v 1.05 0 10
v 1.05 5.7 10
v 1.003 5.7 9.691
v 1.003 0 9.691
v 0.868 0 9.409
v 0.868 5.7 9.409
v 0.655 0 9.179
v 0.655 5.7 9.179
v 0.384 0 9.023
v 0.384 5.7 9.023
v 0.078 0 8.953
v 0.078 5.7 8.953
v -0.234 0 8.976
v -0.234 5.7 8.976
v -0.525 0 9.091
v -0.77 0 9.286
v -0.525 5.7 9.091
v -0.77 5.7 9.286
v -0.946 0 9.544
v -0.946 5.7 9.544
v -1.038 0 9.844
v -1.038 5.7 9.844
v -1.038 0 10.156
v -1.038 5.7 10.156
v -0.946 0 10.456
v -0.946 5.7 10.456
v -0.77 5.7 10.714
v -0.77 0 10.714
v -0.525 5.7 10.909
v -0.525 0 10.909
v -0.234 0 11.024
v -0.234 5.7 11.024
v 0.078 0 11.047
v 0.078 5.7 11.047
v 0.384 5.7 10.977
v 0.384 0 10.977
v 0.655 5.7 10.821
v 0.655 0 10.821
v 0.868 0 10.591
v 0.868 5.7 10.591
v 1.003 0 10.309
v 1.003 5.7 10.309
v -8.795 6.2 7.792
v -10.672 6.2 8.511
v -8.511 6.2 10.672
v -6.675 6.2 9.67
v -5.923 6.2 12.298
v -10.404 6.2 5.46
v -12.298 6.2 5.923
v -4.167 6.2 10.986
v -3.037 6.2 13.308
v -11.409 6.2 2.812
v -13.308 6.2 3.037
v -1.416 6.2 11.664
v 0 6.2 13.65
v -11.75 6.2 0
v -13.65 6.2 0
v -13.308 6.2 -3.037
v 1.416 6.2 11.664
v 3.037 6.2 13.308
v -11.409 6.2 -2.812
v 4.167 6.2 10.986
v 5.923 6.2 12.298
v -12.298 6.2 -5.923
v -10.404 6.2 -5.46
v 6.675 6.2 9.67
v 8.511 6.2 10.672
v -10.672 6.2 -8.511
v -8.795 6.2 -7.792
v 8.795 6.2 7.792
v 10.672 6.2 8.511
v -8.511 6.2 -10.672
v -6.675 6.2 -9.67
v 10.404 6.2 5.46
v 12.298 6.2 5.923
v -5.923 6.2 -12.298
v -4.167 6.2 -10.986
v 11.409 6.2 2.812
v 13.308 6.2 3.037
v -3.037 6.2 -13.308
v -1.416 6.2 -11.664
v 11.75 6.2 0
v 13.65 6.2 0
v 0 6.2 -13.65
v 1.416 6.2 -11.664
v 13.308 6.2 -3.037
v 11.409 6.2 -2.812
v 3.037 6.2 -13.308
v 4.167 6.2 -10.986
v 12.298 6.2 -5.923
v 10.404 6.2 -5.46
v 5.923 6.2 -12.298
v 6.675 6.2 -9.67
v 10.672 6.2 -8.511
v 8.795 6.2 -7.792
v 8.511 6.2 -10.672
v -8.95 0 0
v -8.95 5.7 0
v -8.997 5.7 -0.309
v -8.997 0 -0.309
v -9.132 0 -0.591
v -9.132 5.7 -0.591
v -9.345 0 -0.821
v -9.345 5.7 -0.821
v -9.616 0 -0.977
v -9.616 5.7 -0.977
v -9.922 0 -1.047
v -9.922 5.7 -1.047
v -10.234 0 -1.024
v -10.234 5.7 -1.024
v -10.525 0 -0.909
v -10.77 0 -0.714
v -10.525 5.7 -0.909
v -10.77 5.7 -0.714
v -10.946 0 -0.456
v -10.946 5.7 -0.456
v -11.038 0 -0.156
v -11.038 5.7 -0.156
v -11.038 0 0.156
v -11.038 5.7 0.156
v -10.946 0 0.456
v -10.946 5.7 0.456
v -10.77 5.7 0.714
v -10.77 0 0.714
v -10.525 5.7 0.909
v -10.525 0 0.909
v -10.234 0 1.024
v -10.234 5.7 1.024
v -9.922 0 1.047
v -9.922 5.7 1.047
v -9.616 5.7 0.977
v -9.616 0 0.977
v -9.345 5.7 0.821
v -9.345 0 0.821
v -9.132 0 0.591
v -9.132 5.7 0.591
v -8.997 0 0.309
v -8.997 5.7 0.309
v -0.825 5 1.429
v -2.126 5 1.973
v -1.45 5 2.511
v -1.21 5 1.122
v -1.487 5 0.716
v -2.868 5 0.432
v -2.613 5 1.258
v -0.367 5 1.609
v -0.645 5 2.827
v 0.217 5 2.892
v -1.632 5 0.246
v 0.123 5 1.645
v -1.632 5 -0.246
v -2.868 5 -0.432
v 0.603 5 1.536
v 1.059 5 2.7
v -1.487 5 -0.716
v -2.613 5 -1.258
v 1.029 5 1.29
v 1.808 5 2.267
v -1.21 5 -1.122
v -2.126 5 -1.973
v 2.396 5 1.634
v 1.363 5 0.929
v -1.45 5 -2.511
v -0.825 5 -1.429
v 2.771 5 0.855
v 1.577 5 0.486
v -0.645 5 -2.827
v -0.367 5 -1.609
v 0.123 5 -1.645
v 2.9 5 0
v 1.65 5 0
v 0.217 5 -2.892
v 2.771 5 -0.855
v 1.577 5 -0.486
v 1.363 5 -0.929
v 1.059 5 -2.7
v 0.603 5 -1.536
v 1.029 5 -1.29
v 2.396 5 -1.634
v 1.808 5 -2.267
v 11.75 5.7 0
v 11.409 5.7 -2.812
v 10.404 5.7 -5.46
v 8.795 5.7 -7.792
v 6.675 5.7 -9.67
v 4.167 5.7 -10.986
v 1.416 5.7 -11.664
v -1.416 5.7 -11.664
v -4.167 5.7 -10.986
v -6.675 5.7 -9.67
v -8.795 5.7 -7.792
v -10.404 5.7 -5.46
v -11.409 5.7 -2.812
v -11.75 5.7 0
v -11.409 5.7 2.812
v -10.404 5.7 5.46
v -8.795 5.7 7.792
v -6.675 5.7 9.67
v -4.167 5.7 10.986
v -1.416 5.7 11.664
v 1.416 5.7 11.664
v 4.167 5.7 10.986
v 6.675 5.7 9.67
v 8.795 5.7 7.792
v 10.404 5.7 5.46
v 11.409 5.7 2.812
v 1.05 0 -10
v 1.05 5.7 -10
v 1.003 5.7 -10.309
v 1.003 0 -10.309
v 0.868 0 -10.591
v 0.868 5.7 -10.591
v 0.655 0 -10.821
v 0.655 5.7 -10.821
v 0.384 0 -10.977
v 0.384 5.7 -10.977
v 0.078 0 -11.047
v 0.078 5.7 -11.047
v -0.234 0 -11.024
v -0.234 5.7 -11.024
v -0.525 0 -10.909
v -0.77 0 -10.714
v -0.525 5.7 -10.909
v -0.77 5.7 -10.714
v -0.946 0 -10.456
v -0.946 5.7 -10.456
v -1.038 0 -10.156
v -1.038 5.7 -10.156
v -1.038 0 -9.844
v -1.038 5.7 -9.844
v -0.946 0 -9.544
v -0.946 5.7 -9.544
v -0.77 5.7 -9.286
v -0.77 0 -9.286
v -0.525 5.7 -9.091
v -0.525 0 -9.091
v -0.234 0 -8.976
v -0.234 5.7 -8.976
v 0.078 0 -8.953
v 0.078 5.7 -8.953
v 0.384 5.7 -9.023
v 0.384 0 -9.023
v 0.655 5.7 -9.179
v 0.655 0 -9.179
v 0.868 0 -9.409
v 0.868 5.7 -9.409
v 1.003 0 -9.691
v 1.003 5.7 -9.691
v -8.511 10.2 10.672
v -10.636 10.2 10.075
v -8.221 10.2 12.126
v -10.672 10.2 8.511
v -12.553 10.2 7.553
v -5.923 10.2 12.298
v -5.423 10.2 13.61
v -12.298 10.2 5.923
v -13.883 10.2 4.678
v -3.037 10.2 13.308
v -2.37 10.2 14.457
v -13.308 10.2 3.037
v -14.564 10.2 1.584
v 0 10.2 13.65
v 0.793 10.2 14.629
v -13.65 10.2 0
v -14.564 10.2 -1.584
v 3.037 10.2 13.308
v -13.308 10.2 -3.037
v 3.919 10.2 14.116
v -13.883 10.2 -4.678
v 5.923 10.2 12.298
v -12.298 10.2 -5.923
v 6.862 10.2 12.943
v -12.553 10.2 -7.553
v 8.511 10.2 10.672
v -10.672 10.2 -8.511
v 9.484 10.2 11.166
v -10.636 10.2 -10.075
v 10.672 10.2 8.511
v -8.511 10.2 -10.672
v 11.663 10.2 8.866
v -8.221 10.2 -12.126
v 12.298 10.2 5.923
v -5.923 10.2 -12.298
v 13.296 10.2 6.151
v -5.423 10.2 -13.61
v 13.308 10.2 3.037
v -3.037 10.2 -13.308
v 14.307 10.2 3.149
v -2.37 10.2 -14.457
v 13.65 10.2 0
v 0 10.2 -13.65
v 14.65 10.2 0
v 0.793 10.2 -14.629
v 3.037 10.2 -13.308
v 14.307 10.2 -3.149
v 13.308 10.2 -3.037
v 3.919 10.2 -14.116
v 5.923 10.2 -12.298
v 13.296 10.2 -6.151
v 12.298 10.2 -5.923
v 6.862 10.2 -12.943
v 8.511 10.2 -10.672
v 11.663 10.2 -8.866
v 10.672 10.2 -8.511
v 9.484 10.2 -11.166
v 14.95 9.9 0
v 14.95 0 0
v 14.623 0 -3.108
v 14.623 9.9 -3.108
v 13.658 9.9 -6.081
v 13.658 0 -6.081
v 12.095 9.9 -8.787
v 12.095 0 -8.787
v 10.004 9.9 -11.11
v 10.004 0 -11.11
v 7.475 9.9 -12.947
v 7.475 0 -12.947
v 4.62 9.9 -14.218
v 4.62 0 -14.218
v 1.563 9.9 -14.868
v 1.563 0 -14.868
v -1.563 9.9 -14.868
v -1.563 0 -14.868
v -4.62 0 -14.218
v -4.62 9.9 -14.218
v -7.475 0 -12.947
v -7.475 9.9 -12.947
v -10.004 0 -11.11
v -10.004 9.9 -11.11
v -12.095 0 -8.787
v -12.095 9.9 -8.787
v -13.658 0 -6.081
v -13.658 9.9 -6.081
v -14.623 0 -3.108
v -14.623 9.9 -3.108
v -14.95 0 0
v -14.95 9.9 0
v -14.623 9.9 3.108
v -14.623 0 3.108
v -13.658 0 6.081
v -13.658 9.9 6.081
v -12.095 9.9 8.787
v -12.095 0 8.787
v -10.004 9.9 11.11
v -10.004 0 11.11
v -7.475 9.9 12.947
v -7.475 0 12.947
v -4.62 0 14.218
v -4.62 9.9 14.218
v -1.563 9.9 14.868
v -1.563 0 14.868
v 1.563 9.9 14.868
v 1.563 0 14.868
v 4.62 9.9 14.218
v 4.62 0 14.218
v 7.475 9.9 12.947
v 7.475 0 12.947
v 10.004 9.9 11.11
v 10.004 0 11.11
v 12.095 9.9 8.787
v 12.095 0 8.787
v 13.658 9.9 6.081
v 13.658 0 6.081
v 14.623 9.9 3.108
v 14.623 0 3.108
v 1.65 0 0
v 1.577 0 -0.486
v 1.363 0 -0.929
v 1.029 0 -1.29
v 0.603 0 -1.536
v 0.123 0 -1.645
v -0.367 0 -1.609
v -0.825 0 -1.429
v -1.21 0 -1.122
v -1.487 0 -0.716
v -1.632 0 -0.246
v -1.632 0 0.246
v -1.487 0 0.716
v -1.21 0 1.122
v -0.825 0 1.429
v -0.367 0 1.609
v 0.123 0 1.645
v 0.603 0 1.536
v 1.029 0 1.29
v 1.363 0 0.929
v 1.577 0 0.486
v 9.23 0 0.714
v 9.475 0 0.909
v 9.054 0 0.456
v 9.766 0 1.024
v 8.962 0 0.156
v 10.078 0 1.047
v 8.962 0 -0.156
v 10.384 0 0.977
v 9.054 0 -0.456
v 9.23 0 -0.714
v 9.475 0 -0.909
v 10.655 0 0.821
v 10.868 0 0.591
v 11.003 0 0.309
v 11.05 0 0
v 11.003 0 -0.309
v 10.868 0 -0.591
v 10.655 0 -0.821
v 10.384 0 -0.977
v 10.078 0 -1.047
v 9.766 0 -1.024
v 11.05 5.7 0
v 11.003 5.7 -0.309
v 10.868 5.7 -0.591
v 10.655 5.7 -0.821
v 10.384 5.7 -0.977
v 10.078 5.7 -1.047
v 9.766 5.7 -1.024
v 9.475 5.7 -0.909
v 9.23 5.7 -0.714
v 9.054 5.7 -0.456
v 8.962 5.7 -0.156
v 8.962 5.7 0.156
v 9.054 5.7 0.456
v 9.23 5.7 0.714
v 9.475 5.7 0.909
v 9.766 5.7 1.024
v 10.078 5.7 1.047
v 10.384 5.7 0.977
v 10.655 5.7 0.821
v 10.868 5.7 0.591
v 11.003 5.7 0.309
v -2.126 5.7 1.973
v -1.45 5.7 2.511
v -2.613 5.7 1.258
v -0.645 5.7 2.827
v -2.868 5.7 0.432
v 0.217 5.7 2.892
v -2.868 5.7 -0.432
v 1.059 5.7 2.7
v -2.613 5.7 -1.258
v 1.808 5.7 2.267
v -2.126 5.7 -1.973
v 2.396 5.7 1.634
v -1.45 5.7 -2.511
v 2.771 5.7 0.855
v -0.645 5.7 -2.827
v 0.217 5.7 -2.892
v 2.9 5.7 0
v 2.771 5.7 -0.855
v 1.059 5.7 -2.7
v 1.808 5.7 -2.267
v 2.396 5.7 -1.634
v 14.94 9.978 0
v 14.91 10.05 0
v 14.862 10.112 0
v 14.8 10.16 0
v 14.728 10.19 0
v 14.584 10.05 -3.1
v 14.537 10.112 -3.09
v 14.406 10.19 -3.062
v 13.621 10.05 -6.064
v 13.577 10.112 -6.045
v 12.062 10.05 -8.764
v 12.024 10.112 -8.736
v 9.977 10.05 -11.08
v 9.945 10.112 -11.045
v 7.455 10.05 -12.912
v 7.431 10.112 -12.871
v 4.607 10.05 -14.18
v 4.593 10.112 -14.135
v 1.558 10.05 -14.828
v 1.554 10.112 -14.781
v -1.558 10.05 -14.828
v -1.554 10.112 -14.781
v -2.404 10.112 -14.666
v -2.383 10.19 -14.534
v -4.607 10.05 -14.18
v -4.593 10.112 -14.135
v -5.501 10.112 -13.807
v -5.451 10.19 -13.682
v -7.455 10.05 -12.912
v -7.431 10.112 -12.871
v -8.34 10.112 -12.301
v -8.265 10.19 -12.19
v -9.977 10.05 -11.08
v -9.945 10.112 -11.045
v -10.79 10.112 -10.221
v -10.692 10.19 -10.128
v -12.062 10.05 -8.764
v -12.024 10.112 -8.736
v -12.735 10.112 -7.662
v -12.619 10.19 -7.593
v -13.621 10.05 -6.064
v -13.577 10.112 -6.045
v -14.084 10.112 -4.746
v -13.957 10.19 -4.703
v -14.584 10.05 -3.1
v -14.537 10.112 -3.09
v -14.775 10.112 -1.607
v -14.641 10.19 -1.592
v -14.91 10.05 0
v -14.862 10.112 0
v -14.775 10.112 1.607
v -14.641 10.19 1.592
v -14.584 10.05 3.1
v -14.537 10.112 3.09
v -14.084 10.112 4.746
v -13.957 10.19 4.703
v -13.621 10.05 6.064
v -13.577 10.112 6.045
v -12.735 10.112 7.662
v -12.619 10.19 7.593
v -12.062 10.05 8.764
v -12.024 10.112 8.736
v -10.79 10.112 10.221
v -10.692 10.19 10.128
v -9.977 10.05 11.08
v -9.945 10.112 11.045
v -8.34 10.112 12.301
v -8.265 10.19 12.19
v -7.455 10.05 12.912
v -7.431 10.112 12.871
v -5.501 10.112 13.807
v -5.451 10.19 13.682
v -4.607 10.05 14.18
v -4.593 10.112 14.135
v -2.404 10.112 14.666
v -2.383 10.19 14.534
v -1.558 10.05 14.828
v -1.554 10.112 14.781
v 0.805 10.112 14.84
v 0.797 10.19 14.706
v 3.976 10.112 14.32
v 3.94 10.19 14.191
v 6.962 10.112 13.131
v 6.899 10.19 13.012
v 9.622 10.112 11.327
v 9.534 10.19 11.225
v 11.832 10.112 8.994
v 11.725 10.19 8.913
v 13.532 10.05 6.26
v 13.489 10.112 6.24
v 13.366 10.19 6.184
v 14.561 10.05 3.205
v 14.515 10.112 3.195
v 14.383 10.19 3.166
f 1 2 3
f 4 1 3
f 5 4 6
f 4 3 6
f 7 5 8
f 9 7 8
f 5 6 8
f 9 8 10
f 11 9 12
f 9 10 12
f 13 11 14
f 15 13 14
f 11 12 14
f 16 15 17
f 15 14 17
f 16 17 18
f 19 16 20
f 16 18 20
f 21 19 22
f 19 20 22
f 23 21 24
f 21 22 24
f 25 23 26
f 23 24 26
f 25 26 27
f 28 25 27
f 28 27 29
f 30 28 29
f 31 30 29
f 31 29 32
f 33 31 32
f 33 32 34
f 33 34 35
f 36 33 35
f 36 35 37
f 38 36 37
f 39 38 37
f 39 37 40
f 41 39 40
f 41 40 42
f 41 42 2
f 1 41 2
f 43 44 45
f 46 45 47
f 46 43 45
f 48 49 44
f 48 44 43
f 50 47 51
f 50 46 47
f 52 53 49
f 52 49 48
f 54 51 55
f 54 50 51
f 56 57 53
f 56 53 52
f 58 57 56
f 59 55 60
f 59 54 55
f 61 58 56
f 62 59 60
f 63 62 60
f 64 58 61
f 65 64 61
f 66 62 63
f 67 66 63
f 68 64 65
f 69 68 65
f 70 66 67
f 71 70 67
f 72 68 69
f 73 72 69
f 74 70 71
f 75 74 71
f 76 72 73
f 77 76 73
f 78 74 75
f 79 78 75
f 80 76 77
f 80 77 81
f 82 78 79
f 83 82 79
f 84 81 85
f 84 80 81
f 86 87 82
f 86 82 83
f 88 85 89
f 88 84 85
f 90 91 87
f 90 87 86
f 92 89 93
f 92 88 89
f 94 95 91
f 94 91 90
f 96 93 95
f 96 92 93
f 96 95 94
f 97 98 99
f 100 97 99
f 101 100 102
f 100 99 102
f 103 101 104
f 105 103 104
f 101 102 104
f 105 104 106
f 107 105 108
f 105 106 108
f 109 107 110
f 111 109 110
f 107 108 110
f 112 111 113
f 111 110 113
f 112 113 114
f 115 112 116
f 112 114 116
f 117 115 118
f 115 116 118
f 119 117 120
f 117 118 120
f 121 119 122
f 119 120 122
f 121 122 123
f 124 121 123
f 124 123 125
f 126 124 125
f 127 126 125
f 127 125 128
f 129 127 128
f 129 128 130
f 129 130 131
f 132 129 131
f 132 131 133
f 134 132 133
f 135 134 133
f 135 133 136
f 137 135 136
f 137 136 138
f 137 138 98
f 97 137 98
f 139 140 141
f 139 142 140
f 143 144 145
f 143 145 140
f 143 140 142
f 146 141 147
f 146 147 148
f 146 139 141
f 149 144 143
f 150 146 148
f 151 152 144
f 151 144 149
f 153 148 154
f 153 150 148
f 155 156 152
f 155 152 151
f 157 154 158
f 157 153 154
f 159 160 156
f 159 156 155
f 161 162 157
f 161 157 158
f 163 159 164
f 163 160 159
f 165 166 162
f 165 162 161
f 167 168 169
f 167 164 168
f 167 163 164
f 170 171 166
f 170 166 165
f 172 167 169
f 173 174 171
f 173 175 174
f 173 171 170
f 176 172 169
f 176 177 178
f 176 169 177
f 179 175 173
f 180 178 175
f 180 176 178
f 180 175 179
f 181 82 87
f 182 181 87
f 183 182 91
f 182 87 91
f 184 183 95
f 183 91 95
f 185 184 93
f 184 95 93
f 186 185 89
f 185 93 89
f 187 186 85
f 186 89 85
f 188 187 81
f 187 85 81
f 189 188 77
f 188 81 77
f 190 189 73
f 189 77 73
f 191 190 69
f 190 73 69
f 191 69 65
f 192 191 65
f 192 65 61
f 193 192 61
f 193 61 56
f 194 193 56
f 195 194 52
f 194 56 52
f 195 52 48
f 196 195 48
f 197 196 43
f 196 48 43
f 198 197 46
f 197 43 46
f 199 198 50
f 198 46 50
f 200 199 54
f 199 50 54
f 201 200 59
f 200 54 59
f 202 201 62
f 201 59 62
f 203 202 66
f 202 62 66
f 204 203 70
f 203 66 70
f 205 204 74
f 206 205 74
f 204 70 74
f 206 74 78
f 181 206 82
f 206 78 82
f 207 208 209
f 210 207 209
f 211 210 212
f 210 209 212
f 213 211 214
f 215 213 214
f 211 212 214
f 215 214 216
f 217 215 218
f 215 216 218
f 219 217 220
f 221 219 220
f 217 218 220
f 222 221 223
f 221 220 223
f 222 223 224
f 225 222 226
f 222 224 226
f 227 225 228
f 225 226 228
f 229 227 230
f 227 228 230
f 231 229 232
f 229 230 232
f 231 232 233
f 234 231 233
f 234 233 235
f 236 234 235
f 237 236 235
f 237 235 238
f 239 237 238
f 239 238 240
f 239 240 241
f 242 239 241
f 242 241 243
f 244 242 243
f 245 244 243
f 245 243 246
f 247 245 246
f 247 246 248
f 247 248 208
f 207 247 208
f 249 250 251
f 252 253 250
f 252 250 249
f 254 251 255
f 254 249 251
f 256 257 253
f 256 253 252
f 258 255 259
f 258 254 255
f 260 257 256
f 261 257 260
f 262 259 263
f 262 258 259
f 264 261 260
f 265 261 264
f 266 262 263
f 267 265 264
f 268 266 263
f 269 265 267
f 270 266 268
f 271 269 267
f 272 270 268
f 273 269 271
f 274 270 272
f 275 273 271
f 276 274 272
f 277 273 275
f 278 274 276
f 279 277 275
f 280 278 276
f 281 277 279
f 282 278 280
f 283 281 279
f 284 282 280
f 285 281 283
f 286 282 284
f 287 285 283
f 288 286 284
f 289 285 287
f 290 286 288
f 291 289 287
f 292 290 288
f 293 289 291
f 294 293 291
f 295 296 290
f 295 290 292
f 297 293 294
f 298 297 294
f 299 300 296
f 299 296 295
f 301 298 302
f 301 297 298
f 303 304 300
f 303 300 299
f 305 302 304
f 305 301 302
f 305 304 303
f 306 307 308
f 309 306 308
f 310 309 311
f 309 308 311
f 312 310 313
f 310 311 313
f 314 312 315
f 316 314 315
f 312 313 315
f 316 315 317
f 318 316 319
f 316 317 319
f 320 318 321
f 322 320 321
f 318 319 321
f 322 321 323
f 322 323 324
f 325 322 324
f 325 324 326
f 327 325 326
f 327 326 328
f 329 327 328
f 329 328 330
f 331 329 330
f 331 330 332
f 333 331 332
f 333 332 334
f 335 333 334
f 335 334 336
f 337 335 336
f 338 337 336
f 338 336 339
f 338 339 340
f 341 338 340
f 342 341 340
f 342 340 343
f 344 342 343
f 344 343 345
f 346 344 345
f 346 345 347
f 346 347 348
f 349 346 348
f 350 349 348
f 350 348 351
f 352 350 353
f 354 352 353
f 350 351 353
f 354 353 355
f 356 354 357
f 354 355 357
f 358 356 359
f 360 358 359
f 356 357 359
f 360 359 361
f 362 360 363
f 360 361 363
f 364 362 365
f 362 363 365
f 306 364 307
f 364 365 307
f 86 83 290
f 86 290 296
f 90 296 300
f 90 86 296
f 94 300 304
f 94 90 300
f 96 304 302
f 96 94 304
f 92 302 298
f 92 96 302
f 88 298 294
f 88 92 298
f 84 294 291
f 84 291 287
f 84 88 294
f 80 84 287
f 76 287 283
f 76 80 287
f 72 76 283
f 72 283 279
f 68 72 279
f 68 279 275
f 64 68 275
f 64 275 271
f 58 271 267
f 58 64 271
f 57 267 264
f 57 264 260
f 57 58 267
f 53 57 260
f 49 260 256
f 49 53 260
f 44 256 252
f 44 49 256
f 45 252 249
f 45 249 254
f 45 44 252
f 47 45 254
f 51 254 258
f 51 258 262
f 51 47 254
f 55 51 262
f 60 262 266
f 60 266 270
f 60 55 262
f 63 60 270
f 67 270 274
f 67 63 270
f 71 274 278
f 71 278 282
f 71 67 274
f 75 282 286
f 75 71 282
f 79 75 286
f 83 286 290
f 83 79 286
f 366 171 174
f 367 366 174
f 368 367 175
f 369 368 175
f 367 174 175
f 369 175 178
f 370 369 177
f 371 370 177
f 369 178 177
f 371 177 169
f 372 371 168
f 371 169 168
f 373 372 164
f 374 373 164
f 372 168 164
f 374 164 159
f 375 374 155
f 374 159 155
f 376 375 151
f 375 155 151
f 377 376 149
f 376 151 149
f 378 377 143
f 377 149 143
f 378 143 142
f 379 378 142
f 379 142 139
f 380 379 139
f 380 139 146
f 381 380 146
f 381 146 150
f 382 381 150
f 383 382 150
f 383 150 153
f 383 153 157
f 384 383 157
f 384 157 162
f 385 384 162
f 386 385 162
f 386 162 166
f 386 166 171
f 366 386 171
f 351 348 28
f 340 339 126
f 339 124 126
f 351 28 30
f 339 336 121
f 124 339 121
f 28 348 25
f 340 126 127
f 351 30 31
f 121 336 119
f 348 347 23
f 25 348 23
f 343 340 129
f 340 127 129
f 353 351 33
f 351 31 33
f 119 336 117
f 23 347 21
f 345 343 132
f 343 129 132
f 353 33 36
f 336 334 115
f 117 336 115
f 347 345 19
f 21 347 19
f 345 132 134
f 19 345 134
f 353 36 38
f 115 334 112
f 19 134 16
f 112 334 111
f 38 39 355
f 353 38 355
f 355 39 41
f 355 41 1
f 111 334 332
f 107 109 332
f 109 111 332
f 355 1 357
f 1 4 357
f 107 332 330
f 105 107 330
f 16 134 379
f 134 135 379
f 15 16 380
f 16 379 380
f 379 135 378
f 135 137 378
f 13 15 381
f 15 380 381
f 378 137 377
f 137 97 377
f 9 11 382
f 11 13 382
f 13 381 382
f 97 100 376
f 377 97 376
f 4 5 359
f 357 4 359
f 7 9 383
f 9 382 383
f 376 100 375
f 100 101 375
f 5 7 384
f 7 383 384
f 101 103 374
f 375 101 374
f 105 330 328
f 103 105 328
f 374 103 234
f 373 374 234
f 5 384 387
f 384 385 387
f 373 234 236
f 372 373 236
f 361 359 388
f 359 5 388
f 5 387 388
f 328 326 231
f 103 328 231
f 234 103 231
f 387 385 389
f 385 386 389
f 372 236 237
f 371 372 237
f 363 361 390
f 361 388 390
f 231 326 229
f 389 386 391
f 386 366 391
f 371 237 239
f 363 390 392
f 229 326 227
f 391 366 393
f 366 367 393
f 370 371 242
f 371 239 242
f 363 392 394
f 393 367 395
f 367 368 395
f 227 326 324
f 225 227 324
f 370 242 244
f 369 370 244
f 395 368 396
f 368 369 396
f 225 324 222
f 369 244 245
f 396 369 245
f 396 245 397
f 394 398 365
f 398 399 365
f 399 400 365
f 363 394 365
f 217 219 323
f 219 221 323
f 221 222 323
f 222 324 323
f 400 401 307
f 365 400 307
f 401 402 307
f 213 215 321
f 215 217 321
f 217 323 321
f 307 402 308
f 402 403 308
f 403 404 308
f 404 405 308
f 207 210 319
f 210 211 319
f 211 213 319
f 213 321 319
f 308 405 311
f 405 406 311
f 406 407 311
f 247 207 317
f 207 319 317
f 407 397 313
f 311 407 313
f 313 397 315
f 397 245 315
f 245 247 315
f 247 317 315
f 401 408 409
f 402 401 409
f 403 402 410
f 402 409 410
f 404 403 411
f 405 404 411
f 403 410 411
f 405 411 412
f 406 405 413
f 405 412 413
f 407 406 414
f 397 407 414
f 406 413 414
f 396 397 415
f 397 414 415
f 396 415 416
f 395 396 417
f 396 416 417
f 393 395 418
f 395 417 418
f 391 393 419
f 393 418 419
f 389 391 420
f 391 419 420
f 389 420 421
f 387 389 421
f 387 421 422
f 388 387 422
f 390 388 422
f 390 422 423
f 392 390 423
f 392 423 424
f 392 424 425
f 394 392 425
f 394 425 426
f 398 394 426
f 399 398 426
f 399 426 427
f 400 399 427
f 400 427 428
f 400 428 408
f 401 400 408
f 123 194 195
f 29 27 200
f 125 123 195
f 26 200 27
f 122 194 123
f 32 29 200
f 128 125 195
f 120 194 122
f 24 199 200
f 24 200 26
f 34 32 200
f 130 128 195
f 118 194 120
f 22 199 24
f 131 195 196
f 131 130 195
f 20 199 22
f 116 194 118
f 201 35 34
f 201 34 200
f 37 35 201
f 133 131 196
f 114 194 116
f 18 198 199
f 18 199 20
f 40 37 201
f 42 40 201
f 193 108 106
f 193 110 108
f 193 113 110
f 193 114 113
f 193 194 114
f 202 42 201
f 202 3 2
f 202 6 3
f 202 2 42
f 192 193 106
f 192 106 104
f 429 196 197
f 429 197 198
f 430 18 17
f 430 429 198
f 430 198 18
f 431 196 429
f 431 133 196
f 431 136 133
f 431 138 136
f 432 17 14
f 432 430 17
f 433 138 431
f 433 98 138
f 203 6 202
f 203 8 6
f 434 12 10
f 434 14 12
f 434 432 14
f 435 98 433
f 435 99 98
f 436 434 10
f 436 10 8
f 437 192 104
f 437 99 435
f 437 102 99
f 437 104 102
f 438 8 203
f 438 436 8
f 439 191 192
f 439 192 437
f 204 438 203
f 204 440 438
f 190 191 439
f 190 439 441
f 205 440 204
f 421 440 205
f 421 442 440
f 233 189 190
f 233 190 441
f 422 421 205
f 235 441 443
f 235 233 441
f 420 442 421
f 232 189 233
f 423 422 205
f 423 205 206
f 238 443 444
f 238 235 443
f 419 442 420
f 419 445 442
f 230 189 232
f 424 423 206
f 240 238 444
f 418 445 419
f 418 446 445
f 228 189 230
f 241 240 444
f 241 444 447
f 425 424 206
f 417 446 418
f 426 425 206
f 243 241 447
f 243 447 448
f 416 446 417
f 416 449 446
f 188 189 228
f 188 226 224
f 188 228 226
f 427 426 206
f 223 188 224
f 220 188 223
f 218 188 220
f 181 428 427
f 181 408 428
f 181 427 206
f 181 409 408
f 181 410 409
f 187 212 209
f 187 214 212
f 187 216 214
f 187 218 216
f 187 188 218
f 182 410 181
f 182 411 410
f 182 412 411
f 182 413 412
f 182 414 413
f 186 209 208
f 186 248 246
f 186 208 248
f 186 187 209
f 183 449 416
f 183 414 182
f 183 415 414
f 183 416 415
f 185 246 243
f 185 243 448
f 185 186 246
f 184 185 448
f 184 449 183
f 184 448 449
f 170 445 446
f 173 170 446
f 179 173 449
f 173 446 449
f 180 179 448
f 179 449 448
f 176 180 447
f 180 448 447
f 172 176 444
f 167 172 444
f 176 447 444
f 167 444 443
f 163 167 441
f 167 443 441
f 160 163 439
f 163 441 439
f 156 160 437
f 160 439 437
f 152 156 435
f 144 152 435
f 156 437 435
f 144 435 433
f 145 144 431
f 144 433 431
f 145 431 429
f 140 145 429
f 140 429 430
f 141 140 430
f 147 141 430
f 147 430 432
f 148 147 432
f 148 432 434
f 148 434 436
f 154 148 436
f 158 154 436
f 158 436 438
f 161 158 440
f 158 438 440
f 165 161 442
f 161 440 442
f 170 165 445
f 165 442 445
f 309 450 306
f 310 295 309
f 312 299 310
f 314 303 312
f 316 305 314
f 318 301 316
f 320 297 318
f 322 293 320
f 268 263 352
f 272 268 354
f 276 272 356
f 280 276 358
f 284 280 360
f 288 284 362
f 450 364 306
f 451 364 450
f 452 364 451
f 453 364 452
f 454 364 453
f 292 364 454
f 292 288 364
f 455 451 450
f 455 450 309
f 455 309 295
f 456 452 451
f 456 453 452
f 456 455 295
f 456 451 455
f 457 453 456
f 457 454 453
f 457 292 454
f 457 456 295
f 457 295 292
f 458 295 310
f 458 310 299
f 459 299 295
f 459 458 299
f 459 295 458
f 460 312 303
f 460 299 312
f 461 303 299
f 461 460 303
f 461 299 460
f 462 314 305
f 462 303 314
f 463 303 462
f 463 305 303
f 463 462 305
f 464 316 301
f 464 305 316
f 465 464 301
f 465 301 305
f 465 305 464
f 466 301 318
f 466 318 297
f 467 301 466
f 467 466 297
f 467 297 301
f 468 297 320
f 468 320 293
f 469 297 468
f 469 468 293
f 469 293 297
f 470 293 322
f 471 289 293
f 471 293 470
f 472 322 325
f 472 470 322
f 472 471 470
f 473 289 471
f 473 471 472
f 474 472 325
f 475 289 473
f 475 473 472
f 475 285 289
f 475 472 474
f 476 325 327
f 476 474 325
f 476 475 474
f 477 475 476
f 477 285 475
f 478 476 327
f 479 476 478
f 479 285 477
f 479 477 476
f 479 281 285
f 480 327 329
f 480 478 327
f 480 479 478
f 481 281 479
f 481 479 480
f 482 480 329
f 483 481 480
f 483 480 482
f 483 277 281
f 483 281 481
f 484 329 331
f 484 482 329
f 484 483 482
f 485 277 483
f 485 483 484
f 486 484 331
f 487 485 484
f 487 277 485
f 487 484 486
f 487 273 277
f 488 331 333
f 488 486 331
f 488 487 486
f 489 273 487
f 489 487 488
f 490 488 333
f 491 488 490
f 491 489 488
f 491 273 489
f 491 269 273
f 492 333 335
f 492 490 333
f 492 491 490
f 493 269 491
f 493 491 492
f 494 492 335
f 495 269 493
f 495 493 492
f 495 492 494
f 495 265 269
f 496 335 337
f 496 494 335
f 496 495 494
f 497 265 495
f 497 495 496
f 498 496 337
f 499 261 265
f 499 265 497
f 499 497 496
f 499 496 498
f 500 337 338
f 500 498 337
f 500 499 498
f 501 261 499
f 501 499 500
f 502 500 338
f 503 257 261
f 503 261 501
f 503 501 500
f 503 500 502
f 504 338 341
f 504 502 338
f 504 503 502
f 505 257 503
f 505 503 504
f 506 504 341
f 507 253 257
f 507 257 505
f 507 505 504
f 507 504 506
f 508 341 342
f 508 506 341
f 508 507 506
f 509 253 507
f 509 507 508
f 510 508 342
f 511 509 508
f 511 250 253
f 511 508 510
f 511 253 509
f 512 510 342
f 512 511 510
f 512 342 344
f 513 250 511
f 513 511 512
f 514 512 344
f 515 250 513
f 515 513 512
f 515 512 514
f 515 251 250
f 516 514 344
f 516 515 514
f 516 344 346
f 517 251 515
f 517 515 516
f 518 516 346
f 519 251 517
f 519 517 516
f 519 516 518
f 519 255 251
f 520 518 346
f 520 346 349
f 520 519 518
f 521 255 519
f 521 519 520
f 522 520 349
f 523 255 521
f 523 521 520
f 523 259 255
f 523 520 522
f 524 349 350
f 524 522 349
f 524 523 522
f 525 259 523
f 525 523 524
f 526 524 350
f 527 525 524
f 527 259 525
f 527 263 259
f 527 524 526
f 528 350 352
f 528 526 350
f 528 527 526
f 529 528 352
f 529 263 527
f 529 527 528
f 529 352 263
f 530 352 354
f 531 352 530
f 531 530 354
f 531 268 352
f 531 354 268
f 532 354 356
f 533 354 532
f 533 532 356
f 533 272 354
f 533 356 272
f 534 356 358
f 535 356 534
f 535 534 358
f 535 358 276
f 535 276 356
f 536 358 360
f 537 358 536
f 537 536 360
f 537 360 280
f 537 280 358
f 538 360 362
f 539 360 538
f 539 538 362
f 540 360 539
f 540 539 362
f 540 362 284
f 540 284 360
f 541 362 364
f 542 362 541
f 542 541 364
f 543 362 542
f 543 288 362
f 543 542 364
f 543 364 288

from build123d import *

# Parameters (mm, degrees)
SKETCH1_R           = 14.95
BOSS_EXTRUDE1_DEPTH = 6.2
SKETCH2_R           = 11.75
CUT_EXTRUDE1_DEPTH  = 0.5
SKETCH3_R           = 14.95
SKETCH3_R_2         = 13.65
BOSS_EXTRUDE2_DEPTH = 4
FILLET1_R           = 0.3
SKETCH4_R           = 1.65
CUT_EXTRUDE2_DEPTH  = 6.7
SKETCH18_R          = 2.9
CUT_EXTRUDE10_DEPTH = 0.7
SKETCH19_R          = 1.05
CUT_EXTRUDE11_DEPTH = 6.7


with BuildPart() as part:
    # Sketch1 → Boss-Extrude1 (new body)
    with BuildSketch(Plane(origin=(0, 0, 0), x_dir=(1, 0, 0), z_dir=(0, 1, 0))):
        Circle(SKETCH1_R)
    extrude(amount=BOSS_EXTRUDE1_DEPTH)

    # Sketch2 → Cut-Extrude1 (cut)
    with BuildSketch(Plane(origin=(0, 6.2, 0), x_dir=(1, 0, 0), z_dir=(0, 1, 0))):
        Circle(SKETCH2_R)
    extrude(amount=-CUT_EXTRUDE1_DEPTH, mode=Mode.SUBTRACT)

    # Sketch3 → Boss-Extrude2 (add)
    with BuildSketch(Plane(origin=(0, 6.2, 0), x_dir=(1, 0, 0), z_dir=(0, 1, 0))):
        Circle(SKETCH3_R)
        Circle(SKETCH3_R_2, mode=Mode.SUBTRACT)
    extrude(amount=BOSS_EXTRUDE2_DEPTH)

    # Fillet1
    fillet1_edges = [part.edges().sort_by_distance(p)[0] for p in [
        (-14.95, 10.2, 0),
    ]]
    fillet(fillet1_edges, radius=FILLET1_R)

    # Sketch4 → Cut-Extrude2 (cut, through all)
    with BuildSketch(Plane(origin=(0, 5.7, 0), x_dir=(1, 0, 0), z_dir=(0, 1, 0))):
        Circle(SKETCH4_R)
    extrude(amount=-CUT_EXTRUDE2_DEPTH, mode=Mode.SUBTRACT)

    # Sketch18 → Cut-Extrude10 (cut)
    with BuildSketch(Plane(origin=(0, 5.7, 0), x_dir=(1, 0, 0), z_dir=(0, 1, 0))):
        Circle(SKETCH18_R)
    extrude(amount=-CUT_EXTRUDE10_DEPTH, mode=Mode.SUBTRACT)

    # Sketch19 → Cut-Extrude11 (cut, through all)
    with BuildSketch(Plane(origin=(0, 5.7, 0), x_dir=(1, 0, 0), z_dir=(0, 1, 0))):
        with Locations((0, 10)):
            Circle(SKETCH19_R)
        with Locations((10, 0)):
            Circle(SKETCH19_R)
        with Locations((0, -10)):
            Circle(SKETCH19_R)
        with Locations((-10, 0)):
            Circle(SKETCH19_R)
    extrude(amount=-CUT_EXTRUDE11_DEPTH, mode=Mode.SUBTRACT)


solid = part.part
